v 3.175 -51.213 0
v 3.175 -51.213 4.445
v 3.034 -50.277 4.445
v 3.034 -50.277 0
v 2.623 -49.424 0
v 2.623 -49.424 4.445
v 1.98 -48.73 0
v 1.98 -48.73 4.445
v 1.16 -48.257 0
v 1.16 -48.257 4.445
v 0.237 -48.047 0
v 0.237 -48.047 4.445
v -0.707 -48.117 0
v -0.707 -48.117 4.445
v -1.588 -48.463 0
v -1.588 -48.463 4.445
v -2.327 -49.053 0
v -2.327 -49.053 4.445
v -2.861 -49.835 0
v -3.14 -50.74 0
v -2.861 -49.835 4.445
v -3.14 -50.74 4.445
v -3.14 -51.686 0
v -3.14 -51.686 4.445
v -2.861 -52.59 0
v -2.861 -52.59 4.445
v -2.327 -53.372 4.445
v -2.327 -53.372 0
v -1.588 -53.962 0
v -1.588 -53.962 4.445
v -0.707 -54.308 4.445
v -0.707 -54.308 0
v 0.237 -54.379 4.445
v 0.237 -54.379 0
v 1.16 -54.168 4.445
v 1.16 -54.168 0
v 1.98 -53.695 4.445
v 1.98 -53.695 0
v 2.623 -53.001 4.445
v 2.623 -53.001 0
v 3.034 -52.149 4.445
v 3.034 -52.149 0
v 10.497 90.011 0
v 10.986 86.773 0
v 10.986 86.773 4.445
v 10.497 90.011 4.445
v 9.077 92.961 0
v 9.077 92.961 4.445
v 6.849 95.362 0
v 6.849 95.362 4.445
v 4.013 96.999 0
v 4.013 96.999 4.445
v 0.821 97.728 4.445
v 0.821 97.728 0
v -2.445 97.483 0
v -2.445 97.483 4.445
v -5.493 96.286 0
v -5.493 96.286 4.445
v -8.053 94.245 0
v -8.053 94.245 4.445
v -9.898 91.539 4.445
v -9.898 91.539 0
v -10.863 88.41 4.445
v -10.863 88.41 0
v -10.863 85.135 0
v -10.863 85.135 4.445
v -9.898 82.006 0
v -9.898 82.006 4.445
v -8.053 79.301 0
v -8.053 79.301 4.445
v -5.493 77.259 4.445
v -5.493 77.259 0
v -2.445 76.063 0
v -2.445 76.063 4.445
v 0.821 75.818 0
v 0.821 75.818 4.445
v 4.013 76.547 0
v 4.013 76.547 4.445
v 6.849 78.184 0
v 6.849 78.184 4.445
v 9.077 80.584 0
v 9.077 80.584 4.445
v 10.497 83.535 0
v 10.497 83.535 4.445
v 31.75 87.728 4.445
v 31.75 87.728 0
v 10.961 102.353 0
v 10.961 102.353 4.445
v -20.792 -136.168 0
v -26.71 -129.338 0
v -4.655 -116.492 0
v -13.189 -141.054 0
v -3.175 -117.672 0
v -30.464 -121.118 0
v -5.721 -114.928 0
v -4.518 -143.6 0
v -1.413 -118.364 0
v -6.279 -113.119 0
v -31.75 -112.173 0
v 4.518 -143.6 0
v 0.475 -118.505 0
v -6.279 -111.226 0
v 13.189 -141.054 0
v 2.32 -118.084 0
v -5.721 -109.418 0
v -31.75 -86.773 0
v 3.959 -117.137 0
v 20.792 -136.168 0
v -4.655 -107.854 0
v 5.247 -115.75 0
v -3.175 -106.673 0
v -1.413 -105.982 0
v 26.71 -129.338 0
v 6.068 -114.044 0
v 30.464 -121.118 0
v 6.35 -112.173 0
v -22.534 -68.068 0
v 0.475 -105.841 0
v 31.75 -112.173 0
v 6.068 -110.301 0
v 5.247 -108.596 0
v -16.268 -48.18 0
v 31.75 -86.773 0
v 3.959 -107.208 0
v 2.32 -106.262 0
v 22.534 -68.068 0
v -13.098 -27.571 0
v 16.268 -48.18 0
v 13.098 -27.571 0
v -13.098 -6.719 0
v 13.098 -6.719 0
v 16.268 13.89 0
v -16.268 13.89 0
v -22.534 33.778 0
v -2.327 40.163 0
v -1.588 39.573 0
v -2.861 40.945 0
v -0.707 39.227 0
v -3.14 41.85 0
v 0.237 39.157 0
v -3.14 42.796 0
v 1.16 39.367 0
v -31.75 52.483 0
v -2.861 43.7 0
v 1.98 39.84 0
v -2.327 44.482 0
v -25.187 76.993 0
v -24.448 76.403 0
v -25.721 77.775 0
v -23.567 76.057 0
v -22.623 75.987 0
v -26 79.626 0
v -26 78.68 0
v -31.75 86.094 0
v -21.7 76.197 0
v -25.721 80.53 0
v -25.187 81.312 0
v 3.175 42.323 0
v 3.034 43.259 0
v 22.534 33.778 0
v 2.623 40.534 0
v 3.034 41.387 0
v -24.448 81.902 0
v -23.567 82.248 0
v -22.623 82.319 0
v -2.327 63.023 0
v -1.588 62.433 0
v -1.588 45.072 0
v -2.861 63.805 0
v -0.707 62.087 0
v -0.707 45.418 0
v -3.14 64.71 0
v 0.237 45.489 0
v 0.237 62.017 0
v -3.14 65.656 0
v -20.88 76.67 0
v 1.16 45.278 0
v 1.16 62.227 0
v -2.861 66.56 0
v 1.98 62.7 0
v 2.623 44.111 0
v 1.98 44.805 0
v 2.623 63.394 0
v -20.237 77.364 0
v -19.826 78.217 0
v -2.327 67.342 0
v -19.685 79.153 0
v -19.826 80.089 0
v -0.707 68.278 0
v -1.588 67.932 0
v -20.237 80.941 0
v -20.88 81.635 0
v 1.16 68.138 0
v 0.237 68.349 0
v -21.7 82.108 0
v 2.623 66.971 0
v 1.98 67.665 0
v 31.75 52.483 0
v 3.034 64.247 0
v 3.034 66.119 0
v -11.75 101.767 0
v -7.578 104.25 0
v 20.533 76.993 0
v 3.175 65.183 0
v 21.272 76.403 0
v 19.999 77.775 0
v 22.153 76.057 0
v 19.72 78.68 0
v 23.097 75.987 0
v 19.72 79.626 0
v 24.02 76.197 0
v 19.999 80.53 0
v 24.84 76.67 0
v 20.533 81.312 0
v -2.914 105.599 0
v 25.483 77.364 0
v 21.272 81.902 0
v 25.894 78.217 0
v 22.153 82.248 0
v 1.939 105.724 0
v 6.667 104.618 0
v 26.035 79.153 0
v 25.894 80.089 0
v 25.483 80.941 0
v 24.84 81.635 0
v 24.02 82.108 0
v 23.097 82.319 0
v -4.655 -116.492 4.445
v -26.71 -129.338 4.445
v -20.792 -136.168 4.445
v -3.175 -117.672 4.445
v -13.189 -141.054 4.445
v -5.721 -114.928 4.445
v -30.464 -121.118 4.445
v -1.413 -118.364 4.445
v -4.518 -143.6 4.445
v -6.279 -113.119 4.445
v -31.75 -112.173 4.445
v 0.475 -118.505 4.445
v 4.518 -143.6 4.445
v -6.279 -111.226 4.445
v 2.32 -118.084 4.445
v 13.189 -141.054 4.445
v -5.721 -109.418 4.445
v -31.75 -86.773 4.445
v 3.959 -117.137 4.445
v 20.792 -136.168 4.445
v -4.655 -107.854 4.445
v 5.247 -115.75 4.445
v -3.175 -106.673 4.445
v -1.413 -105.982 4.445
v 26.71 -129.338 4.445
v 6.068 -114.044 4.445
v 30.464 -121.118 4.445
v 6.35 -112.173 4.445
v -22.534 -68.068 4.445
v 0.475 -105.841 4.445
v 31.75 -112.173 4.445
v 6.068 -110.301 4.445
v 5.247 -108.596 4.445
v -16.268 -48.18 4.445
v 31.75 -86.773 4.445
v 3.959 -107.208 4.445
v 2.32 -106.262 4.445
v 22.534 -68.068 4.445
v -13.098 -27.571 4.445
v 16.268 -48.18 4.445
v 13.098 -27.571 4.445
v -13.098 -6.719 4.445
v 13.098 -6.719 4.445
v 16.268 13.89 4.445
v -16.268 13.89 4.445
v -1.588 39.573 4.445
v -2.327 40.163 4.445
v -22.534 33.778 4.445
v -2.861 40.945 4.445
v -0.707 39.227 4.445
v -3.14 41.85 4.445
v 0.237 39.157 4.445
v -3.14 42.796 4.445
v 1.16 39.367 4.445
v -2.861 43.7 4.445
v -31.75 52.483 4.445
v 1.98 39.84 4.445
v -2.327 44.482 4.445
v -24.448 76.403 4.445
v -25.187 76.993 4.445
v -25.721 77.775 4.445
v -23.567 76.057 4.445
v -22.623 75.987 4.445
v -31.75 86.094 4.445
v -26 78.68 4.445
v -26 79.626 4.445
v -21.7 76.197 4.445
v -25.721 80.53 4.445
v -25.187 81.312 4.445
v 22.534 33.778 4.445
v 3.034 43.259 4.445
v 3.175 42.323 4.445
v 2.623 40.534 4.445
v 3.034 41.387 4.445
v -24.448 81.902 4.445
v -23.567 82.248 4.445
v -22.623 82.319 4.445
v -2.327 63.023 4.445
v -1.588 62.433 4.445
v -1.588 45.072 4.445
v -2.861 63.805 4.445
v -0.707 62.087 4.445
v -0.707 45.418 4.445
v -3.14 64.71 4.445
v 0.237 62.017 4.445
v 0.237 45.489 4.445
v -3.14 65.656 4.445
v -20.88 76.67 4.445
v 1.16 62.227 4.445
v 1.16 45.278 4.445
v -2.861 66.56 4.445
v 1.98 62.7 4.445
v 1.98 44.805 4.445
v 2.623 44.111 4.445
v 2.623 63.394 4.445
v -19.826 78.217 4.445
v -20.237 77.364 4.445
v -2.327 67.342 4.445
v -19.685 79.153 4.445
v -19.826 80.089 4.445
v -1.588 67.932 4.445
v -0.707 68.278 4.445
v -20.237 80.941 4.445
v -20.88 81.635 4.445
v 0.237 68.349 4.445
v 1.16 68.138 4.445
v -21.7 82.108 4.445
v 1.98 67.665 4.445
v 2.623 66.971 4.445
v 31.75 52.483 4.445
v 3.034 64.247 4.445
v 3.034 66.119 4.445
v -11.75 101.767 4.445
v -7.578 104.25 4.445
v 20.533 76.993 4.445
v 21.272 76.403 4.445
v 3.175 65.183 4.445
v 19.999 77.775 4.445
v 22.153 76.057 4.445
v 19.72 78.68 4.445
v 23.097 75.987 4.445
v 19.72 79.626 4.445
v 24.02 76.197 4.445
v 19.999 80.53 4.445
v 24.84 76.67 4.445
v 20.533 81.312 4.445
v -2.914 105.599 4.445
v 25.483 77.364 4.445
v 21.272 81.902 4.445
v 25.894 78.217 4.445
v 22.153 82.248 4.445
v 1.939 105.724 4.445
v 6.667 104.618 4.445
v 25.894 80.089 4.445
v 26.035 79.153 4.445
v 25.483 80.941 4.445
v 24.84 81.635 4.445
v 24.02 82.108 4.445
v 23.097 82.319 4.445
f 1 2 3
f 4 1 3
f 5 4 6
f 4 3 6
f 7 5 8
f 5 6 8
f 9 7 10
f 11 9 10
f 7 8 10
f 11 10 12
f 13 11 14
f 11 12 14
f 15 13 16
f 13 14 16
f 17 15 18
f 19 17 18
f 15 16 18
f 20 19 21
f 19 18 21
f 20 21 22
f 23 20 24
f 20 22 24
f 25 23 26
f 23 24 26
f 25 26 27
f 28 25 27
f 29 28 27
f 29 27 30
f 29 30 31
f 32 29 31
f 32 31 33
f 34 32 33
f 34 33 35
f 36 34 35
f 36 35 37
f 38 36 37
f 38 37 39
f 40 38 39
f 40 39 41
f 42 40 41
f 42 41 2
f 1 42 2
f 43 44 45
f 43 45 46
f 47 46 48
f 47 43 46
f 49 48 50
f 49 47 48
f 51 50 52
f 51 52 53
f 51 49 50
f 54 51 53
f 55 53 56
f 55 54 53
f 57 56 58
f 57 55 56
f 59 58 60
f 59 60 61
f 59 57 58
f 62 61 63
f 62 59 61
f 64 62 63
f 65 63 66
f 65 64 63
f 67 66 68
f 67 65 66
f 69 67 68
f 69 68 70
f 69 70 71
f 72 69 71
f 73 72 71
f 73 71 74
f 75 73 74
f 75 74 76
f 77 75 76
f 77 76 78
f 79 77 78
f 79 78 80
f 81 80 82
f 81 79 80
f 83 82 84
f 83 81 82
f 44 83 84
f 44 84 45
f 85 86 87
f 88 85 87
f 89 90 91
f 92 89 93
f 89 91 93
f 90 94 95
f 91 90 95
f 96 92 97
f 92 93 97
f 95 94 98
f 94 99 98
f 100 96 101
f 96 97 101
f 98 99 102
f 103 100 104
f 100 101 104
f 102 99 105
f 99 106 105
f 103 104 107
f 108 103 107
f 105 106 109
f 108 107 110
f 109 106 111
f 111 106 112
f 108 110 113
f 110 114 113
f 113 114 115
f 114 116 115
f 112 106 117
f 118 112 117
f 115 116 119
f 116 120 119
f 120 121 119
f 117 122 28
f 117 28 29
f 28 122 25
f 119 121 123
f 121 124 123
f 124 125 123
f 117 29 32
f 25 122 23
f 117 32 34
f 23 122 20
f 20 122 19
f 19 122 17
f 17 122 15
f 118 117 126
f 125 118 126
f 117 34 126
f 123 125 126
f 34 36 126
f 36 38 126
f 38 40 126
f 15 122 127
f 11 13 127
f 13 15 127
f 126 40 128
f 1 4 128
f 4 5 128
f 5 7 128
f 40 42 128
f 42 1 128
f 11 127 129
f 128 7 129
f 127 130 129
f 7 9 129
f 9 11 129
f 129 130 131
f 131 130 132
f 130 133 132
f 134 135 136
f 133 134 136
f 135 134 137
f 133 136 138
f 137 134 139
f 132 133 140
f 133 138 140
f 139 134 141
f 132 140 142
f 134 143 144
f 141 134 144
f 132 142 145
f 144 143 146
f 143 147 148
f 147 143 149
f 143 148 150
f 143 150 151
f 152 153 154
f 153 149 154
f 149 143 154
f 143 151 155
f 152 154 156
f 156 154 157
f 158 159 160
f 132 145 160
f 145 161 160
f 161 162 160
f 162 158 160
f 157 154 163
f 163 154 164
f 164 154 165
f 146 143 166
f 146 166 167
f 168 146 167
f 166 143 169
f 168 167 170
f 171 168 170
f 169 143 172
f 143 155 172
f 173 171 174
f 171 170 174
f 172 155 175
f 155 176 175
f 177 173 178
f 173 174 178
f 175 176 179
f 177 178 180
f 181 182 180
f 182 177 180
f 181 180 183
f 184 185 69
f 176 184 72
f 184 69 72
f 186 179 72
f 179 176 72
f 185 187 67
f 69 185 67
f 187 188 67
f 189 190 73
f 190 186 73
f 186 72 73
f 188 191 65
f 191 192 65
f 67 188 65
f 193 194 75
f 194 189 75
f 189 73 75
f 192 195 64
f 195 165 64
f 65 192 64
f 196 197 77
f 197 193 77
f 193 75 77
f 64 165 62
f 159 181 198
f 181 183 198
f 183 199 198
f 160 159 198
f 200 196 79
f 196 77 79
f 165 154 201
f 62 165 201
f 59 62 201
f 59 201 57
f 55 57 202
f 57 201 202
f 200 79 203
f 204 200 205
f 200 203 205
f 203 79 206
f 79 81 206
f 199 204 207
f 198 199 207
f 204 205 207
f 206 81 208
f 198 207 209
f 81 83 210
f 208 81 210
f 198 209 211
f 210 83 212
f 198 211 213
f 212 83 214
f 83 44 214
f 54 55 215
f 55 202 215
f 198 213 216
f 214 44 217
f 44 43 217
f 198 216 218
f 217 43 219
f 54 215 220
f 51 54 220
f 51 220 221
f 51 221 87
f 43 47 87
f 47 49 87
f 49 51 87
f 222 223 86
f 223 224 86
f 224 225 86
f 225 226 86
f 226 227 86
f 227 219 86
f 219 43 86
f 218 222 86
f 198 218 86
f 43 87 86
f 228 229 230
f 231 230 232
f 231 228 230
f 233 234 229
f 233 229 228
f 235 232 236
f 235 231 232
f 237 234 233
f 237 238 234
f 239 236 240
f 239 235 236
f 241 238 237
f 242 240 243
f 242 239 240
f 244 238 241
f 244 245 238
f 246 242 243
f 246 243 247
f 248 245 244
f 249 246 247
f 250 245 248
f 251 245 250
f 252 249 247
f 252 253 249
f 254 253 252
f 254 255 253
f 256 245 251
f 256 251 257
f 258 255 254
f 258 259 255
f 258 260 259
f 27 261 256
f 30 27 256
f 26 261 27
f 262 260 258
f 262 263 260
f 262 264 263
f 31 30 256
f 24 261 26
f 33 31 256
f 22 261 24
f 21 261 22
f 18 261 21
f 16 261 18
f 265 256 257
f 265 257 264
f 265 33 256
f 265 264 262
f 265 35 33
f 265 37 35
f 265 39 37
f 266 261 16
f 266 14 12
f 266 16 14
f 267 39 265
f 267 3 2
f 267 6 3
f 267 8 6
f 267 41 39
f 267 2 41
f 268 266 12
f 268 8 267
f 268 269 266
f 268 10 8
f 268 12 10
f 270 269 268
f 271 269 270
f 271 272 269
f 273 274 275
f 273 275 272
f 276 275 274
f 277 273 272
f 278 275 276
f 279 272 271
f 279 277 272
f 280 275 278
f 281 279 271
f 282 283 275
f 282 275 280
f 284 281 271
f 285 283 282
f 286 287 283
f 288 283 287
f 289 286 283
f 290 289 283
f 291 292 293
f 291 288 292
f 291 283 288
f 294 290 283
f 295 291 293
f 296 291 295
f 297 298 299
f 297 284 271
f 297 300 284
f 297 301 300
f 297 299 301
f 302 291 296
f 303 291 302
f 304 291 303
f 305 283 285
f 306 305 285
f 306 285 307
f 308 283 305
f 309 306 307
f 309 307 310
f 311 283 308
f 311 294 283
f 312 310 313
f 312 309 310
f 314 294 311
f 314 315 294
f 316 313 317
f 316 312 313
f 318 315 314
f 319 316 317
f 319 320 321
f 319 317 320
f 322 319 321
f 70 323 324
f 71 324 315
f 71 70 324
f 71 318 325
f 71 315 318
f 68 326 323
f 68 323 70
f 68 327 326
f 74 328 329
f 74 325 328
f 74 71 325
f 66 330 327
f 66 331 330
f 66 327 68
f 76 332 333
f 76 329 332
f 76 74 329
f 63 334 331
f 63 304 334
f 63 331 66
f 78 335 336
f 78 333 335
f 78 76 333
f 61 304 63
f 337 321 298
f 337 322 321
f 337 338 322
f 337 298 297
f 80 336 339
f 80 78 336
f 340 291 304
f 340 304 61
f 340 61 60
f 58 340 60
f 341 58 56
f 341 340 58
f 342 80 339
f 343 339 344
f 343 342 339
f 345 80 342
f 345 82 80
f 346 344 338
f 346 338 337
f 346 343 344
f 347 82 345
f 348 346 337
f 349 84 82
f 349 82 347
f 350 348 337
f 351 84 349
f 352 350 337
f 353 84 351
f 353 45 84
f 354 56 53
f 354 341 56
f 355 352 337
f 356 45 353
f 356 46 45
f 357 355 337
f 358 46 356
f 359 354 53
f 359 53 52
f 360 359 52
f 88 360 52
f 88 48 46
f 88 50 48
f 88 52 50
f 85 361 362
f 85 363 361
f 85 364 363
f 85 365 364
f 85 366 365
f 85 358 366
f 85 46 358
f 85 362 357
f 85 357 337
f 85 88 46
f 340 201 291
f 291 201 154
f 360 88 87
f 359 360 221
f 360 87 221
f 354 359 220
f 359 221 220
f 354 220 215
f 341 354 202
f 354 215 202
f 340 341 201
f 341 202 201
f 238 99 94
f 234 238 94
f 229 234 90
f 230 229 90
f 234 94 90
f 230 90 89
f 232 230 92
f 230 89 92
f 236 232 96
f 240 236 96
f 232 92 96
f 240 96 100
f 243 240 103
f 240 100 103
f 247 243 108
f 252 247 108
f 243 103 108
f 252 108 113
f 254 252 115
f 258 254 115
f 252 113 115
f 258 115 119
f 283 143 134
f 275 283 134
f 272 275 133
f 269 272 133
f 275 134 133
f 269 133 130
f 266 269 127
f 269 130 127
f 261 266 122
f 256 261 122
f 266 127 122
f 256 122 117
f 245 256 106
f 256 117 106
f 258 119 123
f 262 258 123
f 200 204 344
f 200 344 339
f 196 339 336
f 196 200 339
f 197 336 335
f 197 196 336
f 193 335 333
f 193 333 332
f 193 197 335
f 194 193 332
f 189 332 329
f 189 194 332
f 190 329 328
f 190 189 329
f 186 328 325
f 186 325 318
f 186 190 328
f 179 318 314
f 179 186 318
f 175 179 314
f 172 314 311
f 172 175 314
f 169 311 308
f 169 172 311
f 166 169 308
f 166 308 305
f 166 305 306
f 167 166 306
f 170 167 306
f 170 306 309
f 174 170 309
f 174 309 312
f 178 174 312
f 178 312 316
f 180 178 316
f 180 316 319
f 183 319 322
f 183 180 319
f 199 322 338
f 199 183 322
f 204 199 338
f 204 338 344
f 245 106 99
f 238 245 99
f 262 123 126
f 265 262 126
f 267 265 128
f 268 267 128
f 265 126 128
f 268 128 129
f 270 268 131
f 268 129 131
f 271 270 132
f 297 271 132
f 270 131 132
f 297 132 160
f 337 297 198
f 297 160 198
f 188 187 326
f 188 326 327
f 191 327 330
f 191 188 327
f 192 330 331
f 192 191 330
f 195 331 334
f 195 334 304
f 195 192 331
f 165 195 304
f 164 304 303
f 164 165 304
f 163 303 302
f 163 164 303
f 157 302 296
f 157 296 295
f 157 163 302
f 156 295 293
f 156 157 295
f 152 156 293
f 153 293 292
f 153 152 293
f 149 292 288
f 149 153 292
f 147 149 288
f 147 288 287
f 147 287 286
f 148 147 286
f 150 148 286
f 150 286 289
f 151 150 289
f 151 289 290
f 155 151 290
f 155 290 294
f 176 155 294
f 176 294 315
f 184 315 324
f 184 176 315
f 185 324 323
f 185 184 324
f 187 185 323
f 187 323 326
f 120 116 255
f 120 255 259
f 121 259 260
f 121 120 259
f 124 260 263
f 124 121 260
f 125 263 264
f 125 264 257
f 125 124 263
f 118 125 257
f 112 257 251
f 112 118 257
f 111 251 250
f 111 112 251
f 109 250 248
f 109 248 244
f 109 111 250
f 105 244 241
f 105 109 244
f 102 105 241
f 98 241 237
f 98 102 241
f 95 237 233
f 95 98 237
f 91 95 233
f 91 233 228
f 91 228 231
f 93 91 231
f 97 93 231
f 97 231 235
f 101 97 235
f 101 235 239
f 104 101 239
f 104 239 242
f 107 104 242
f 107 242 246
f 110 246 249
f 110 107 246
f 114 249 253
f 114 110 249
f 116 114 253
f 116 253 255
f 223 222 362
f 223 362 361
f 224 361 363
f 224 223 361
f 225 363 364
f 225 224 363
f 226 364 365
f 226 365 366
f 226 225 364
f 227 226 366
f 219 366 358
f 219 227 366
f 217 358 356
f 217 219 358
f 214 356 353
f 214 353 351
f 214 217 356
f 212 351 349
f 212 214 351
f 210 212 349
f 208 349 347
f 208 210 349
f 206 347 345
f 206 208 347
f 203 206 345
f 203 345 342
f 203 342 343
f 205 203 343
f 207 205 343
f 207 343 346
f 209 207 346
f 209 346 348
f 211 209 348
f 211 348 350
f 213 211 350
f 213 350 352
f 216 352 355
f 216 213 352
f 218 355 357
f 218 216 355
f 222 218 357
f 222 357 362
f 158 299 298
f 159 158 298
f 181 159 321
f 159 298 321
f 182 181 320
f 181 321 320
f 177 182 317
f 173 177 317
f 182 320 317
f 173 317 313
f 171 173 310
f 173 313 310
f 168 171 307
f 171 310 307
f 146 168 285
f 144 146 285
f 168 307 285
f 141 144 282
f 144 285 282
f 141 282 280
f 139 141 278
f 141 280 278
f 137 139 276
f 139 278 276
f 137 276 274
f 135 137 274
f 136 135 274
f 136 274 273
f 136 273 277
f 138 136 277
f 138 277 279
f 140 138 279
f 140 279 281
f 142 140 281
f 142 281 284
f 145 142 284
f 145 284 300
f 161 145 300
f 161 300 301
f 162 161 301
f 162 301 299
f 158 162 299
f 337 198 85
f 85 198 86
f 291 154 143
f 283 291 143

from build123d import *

# Parameters (mm, degrees)
SKETCH2_R           = 6.35
SKETCH2_R_2         = 3.175
SKETCH2_R_3         = 10.9855
BOSS_EXTRUDE1_DEPTH = 4.445
SKETCH4_R           = 3.175
CUT_EXTRUDE2_DEPTH  = 148.450257689
CUT_EXTRUDE3_DEPTH  = 148.450257689


with BuildPart() as part:
    # Sketch2 → Boss-Extrude1 (new body)
    with BuildSketch(Plane.XY):
        with BuildLine():
            Line((31.75, 112.17275), (-31.75, 112.17275))
            Line((-31.75, 112.17275), (-31.75, 52.48275))
            ThreePointArc((-31.75, 52.48275), (-12.7, -17.145), (-31.75, -86.77275))
            Line((-31.75, -86.77275), (-31.75, -112.17275))
            ThreePointArc((-31.75, -112.17275), (0, -143.92275), (31.75, -112.17275))
            Line((31.75, -112.17275), (31.75, -86.77275))
            ThreePointArc((31.75, -86.77275), (12.7, -17.145), (31.75, 52.48275))
            Line((31.75, 52.48275), (31.75, 112.17275))
        make_face()
        with Locations((0, -112.17275)):
            Circle(SKETCH2_R, mode=Mode.SUBTRACT)
        with Locations((-22.86, 79.15275)):
            Circle(SKETCH2_R_2, mode=Mode.SUBTRACT)
        with Locations((0, 65.18275)):
            Circle(SKETCH2_R_2, mode=Mode.SUBTRACT)
        with Locations((0, 86.77275)):
            Circle(SKETCH2_R_3, mode=Mode.SUBTRACT)
        with Locations((22.86, 79.15275)):
            Circle(SKETCH2_R_2, mode=Mode.SUBTRACT)
    extrude(amount=BOSS_EXTRUDE1_DEPTH)

    # Sketch4 → Cut-Extrude2 (cut, through all)
    with BuildSketch(Plane.XY.offset(4.445)):
        with Locations((0, 42.32275)):
            Circle(SKETCH4_R)
        with Locations((0, -51.21275)):
            Circle(SKETCH4_R)
    extrude(amount=-CUT_EXTRUDE2_DEPTH, mode=Mode.SUBTRACT)

    # Sketch6 → Cut-Extrude3 (cut, through all)
    with BuildSketch(Plane(origin=(0, 0, 0), x_dir=(-1, 0, 0), z_dir=(0, 0, -1))):
        with BuildLine():
            Line((-31.75, 87.727850063), (-10.961308866, 102.353257307))
            ThreePointArc((-10.961308866, 102.353257307), (0.491450562, 105.816409741), (11.750340751, 101.767148695))
            Line((11.750340751, 101.767148695), (31.75, 86.094442115))
            Line((31.75, 86.094442115), (31.75, 114.970728373))
            Line((31.75, 114.970728373), (-31.75, 114.970728373))
            Line((-31.75, 114.970728373), (-31.75, 87.727850063))
        make_face()
    extrude(amount=-CUT_EXTRUDE3_DEPTH, mode=Mode.SUBTRACT)


solid = part.part
